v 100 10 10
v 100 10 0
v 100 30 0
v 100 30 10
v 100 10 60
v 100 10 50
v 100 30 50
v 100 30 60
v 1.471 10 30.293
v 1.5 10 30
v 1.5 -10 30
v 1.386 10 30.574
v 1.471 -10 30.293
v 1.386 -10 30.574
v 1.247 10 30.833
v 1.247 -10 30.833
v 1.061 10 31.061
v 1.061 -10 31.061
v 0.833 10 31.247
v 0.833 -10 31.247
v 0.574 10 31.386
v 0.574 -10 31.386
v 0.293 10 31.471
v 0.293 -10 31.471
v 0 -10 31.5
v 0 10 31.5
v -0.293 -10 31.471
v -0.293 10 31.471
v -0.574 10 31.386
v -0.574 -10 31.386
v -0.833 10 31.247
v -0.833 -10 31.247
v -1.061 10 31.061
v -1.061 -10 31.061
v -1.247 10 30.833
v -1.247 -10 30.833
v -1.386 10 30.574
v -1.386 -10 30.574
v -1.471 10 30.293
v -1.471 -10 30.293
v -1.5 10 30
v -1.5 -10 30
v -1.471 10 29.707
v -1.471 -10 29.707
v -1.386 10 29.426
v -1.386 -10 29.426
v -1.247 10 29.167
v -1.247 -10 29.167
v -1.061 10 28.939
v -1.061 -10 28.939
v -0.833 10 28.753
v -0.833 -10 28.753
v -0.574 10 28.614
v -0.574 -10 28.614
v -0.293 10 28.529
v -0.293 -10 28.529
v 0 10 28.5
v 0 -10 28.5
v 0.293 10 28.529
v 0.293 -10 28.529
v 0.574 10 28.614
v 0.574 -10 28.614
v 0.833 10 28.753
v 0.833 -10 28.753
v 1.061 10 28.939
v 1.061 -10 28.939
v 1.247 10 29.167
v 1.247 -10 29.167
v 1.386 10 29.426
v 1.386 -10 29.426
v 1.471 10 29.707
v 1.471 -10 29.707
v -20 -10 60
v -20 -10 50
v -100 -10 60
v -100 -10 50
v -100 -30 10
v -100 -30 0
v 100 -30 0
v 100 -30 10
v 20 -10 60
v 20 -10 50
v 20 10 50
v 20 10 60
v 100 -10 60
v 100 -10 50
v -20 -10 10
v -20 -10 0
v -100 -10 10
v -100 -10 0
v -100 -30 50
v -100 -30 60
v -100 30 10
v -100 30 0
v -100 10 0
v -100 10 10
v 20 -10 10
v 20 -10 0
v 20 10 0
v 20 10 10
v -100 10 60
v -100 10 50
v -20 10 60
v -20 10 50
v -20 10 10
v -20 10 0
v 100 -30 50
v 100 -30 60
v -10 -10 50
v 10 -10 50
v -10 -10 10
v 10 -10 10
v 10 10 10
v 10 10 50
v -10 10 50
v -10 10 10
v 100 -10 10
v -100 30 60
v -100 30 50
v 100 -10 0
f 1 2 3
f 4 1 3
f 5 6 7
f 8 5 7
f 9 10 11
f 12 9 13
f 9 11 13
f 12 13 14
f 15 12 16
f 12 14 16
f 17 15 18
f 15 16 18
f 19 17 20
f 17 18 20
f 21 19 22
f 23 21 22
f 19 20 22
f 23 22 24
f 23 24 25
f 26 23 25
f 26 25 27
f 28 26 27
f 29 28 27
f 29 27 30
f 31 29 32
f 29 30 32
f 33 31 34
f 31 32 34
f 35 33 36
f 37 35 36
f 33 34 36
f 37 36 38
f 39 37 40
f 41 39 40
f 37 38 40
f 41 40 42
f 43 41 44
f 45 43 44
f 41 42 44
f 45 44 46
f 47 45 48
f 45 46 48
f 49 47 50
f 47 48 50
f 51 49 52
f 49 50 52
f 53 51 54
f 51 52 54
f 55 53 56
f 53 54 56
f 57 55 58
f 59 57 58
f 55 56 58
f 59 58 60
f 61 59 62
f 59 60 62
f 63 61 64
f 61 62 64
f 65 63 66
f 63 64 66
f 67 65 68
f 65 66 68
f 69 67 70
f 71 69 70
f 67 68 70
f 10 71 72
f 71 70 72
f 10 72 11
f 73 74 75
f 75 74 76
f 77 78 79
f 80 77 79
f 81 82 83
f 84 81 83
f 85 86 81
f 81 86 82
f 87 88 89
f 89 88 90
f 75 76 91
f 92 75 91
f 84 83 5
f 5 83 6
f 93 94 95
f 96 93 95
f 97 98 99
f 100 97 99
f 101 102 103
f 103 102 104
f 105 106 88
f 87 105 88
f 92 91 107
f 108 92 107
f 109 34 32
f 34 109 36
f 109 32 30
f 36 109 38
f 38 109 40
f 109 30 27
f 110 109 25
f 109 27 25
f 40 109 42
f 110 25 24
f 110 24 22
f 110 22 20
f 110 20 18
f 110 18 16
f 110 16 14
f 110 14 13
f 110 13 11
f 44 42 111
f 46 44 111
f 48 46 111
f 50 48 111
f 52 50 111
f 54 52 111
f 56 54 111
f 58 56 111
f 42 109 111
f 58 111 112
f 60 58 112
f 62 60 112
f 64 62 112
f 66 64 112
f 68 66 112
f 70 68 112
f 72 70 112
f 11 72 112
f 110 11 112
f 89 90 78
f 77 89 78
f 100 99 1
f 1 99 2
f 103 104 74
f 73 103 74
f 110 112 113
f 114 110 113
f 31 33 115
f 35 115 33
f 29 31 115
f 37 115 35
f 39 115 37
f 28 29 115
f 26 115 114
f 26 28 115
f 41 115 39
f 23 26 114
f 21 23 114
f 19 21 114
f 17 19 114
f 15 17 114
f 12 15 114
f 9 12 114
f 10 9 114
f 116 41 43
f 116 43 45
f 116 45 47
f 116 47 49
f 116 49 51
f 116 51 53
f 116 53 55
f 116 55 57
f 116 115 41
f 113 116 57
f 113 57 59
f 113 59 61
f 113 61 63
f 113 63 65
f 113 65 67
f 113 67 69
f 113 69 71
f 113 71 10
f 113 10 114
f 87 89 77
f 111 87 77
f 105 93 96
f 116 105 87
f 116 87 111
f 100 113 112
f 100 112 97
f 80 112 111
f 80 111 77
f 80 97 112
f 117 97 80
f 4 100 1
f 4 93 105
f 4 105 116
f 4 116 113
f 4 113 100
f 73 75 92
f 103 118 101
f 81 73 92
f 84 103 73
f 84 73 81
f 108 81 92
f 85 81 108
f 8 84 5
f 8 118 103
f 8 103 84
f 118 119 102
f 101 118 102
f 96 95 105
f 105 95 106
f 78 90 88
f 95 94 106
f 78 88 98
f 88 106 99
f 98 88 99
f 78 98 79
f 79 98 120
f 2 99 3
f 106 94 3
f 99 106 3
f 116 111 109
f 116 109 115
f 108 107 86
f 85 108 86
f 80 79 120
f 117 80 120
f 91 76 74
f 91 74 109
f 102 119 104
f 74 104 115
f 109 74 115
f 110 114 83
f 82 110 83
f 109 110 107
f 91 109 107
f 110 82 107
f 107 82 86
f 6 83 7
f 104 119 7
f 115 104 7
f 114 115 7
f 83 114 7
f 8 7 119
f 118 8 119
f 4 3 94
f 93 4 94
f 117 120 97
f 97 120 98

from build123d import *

# Parameters (mm, degrees)
F1_DEPTH = 10
F2_W     = 20
F2_H     = 20
F3_DEPTH = 40
F4_R     = 1.5
F5_DEPTH = 20
F6_W     = 20
F6_H     = 20
F7_DEPTH = 10


with BuildPart() as f1:
    # F0 (on Top) → F1 (new body)
    with BuildSketch(Plane.XY):
        Polygon((-100, -10), (-100, -30), (100, -30), (100, -10), (20, -10), (20, 10), (100, 10), (100, 30), (-100, 30), (-100, 10), (-20, 10), (-20, -10), align=None)
    extrude(amount=F1_DEPTH)

    # F2 (on face) → F3 (join)
    with BuildSketch(Plane.XY.offset(10)):
        Rectangle(F2_W, F2_H)
    extrude(amount=F3_DEPTH)

    # F4 (on face) → F5 (cut)
    with BuildSketch(Plane.XZ.offset(10)):
        with Locations((0, 30)):
            Circle(F4_R)
    extrude(amount=-F5_DEPTH, mode=Mode.SUBTRACT)

    # F6 (on face) → F7 (join)
    with BuildSketch(Plane.XY.offset(50)):
        Polygon((-20, 10), (-20, -10), (-100, -10), (-100, -30), (100, -30), (100, -10), (20, -10), (20, 10), (100, 10), (100, 30), (-100, 30), (-100, 10), align=None)
        Rectangle(F6_W, F6_H, mode=Mode.SUBTRACT)
        Rectangle(F6_W, F6_H)
    extrude(amount=F7_DEPTH)


solid = f1.part
